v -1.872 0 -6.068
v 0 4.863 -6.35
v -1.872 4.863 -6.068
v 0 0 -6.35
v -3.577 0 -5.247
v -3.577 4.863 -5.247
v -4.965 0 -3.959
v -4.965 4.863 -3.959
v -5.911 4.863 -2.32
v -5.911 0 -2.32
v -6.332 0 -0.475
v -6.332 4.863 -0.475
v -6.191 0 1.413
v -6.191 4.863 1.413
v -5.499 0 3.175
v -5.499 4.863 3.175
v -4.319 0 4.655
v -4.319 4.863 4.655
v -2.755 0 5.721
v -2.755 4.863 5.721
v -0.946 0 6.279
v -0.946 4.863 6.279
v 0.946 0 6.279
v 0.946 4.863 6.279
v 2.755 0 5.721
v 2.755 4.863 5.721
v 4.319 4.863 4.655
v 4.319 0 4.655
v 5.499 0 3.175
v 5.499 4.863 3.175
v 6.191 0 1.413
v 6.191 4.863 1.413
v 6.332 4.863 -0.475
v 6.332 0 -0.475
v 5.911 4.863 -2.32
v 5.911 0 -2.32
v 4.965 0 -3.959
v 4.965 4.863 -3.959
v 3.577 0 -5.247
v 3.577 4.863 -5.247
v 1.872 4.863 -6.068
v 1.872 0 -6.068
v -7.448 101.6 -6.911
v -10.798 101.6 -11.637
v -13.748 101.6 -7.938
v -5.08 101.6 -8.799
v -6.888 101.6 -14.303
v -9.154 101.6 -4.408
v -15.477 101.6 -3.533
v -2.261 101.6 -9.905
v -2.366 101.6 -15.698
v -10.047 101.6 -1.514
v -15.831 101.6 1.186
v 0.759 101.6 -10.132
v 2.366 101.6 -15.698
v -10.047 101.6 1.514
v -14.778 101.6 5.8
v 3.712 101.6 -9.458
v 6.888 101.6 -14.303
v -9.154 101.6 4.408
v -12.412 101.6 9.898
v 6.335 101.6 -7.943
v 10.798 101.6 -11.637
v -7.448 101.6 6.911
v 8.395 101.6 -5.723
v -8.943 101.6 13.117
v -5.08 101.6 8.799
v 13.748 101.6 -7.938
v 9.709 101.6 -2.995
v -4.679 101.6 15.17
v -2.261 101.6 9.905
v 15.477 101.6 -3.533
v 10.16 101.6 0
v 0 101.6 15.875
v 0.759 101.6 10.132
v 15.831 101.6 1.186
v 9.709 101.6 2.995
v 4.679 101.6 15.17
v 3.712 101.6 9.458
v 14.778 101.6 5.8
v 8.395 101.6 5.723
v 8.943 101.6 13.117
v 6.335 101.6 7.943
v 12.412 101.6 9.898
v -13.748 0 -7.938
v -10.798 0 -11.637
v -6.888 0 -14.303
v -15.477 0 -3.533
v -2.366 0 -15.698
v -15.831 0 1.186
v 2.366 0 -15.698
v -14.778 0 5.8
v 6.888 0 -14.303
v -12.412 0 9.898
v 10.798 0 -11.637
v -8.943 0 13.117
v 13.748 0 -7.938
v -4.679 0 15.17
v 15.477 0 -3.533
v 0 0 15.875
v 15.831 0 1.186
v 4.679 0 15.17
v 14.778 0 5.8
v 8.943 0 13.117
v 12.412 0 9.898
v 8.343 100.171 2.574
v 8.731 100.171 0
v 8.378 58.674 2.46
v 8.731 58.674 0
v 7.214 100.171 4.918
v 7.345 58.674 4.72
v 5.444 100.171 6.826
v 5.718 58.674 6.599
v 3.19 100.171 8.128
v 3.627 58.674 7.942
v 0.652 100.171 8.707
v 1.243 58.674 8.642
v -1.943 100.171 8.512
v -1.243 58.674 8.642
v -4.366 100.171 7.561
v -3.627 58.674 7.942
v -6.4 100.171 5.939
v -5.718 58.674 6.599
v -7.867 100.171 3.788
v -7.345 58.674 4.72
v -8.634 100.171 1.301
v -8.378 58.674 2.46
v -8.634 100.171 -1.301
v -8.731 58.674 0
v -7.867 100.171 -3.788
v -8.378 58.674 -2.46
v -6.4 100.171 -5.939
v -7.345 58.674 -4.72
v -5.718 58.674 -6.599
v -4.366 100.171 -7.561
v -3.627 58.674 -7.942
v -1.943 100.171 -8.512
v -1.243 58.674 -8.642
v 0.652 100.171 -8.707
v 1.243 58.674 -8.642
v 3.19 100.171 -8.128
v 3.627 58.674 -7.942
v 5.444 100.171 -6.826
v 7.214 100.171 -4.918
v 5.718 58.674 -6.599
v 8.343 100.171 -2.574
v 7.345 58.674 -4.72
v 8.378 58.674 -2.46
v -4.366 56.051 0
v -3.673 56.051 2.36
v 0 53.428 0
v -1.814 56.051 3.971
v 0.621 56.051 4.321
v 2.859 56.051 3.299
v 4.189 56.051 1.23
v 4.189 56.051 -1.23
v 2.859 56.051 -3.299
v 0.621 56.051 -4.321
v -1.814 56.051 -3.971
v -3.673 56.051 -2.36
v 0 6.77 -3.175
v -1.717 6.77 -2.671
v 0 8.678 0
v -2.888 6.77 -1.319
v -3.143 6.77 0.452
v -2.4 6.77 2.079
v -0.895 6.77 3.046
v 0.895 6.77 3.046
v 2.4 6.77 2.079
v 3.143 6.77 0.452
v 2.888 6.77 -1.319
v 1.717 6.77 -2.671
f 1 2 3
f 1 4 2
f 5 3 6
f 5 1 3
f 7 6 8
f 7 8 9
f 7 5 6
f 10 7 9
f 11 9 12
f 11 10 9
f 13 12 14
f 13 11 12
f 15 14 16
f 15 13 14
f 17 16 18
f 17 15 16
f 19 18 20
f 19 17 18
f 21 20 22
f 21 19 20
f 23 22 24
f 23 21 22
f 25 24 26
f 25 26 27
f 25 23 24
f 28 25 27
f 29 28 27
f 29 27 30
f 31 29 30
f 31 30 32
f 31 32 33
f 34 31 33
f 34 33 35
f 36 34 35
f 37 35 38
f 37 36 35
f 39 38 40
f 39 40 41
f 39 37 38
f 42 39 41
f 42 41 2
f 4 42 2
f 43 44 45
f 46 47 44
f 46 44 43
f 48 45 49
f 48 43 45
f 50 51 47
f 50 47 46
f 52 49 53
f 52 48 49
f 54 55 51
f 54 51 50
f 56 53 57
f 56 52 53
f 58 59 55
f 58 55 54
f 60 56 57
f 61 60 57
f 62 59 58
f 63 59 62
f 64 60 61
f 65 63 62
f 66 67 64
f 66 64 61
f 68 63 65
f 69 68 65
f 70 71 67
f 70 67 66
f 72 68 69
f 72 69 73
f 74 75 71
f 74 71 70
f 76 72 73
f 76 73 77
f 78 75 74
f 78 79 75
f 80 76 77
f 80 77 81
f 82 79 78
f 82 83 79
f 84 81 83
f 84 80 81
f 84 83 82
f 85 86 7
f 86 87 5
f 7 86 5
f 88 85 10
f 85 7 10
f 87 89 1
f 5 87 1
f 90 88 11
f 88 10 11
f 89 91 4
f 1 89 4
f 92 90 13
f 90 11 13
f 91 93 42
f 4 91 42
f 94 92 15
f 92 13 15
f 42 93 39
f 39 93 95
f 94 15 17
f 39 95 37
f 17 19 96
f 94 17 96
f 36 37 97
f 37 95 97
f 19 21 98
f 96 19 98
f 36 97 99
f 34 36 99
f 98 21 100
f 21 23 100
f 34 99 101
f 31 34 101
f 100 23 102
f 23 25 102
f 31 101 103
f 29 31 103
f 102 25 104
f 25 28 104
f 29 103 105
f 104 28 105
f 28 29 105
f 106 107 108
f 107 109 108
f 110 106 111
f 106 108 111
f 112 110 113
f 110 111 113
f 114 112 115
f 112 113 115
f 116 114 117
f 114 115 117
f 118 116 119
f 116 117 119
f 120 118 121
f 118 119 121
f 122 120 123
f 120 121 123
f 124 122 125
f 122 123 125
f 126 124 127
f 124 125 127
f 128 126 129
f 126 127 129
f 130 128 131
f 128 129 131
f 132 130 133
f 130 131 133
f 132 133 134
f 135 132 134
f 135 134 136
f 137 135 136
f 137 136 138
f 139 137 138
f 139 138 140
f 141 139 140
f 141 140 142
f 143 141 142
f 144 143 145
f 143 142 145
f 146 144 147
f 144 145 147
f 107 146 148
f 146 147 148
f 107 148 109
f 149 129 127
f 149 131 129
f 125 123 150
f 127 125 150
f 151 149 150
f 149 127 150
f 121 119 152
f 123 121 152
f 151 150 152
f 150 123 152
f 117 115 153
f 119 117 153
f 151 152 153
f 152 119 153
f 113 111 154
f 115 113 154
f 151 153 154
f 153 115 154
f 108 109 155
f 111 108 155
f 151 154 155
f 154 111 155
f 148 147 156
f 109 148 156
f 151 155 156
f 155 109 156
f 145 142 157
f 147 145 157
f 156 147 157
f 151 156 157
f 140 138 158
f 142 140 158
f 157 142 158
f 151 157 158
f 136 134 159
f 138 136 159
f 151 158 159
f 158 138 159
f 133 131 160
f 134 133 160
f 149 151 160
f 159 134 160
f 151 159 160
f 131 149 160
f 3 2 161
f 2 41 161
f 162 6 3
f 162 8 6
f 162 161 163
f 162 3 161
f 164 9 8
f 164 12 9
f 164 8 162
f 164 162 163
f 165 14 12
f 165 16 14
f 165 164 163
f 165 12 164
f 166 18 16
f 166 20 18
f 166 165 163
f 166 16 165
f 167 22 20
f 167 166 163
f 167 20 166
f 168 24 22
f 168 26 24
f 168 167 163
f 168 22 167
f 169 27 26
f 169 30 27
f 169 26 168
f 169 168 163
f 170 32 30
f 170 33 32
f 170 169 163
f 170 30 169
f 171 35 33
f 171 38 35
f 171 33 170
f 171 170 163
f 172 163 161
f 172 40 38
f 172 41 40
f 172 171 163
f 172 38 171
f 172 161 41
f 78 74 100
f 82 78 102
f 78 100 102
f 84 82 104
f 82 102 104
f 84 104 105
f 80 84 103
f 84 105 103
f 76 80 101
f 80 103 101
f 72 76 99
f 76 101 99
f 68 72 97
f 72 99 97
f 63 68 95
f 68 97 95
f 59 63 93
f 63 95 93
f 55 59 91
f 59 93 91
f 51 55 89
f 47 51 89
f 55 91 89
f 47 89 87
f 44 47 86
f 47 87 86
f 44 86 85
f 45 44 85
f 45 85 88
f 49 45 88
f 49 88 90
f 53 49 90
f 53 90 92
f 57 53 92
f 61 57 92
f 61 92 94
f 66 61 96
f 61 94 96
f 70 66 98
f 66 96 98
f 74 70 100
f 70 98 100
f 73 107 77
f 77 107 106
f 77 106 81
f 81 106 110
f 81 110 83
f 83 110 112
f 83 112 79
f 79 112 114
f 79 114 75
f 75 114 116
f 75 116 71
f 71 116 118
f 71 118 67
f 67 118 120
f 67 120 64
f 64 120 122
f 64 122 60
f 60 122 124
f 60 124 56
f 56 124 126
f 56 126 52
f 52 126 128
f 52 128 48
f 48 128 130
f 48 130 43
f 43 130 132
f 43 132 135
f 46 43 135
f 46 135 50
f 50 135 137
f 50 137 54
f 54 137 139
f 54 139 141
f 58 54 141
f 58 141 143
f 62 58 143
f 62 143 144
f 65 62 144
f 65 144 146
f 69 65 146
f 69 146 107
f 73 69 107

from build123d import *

# Parameters (mm, degrees)
SKETCH1_R                         = 15.875
BOSS_EXTRUDE1_DEPTH               = 101.6
F_3_4_16_TAPPED_HOLE1_D           = 17.4625
F_3_4_16_TAPPED_HOLE1_DEPTH       = 42.926
F_3_4_16_TAPPED_HOLE1_CSINK_D     = 20.32
F_3_4_16_TAPPED_HOLE1_CSINK_ANGLE = 90
F_3_4_16_TAPPED_HOLE1_TIP         = 5.24626428


with BuildPart() as part:
    # Sketch1 → Boss-Extrude1 (new body)
    with BuildSketch(Plane(origin=(0, 0, 0), x_dir=(-1, 0, 0), z_dir=(0, 1, 0))):
        with Locations(Location((0, 0, 0), (0, 0, 90))):
            Circle(SKETCH1_R)
    extrude(amount=BOSS_EXTRUDE1_DEPTH)

    # Sketch2 → Cut-Revolve1 (revolve, cut)
    with BuildSketch(Plane(origin=(0, 0, 0), x_dir=(0, 1, 0), z_dir=(0, 0, 1)), mode=Mode.PRIVATE) as cut_revolve1_sk:
        Polygon((0, -6.35), (0, 0), (8.678122072, 0), (4.862657141, -6.35), align=None)
    revolve(cut_revolve1_sk.sketch.rotate(Axis((0, 0, 0), (0, 1, 0)), 90), axis=Axis((0, 0, 0), (0, 1, 0)), mode=Mode.SUBTRACT)

    # 3/4-16 Tapped Hole1
    with Locations(Plane(origin=(0, 101.6, 0), x_dir=(-1, 0, 0), z_dir=(0, 1, 0))):
        with Locations((0, 0)):
            CounterSinkHole(F_3_4_16_TAPPED_HOLE1_D / 2, F_3_4_16_TAPPED_HOLE1_CSINK_D / 2, depth=F_3_4_16_TAPPED_HOLE1_DEPTH, counter_sink_angle=F_3_4_16_TAPPED_HOLE1_CSINK_ANGLE)
            with Locations((0, 0, -(F_3_4_16_TAPPED_HOLE1_DEPTH + F_3_4_16_TAPPED_HOLE1_TIP / 2))):  # 118° drill point
                Cone(0, F_3_4_16_TAPPED_HOLE1_D / 2, F_3_4_16_TAPPED_HOLE1_TIP, mode=Mode.SUBTRACT)


solid = part.part
